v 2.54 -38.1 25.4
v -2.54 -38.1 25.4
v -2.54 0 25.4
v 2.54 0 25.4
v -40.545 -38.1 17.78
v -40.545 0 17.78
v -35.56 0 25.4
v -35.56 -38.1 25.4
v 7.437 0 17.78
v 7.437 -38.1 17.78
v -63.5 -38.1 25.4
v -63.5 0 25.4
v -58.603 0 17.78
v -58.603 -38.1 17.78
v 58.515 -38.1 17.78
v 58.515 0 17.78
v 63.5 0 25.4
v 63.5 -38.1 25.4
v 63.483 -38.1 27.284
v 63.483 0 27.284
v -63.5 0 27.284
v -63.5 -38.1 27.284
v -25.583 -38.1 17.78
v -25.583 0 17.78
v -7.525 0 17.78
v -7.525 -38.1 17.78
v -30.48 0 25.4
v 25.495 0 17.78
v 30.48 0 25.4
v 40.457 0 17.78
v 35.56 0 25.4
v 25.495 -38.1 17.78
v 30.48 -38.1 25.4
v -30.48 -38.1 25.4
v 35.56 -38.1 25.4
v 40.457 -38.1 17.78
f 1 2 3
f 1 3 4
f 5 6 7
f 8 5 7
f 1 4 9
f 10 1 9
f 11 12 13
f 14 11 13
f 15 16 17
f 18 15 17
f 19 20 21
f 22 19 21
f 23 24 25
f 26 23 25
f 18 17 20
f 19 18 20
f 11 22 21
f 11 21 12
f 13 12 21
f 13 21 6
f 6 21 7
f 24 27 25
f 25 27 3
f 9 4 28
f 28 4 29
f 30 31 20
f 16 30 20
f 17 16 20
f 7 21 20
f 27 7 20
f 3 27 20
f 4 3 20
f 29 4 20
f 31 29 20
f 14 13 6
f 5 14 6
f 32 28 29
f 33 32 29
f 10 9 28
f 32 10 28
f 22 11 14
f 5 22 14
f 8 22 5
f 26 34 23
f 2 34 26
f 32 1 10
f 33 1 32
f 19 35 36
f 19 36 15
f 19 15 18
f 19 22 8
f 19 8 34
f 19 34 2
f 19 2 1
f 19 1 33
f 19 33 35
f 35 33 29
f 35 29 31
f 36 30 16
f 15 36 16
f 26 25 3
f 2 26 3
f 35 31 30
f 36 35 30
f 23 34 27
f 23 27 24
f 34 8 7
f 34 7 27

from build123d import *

# Parameters (mm, degrees)
F1_DEPTH = 38.1


with BuildPart() as f1:
    # F0 (on Front) → F1 (new body)
    with BuildSketch(Plane.XZ):
        Polygon((-35.56, 25.4), (-63.5, 25.4), (-58.603186, 17.78), (-40.54516, 17.78), align=None)
        Polygon((-2.54, 25.4), (-30.48, 25.4), (-25.583186, 17.78), (-7.52516, 17.78), align=None)
        Polygon((30.48, 25.4), (2.54, 25.4), (7.436814, 17.78), (25.49484, 17.78), align=None)
        Polygon((58.51484, 17.78), (63.5, 25.4), (35.56, 25.4), (40.456814, 17.78), align=None)
        Polygon((-63.5, 27.284326), (-63.5, 25.4), (-35.56, 25.4), (-30.48, 25.4), (-2.54, 25.4), (2.54, 25.4), (30.48, 25.4), (35.56, 25.4), (63.5, 25.4), (63.483231, 27.284326), align=None)
    extrude(amount=F1_DEPTH)


solid = f1.part
